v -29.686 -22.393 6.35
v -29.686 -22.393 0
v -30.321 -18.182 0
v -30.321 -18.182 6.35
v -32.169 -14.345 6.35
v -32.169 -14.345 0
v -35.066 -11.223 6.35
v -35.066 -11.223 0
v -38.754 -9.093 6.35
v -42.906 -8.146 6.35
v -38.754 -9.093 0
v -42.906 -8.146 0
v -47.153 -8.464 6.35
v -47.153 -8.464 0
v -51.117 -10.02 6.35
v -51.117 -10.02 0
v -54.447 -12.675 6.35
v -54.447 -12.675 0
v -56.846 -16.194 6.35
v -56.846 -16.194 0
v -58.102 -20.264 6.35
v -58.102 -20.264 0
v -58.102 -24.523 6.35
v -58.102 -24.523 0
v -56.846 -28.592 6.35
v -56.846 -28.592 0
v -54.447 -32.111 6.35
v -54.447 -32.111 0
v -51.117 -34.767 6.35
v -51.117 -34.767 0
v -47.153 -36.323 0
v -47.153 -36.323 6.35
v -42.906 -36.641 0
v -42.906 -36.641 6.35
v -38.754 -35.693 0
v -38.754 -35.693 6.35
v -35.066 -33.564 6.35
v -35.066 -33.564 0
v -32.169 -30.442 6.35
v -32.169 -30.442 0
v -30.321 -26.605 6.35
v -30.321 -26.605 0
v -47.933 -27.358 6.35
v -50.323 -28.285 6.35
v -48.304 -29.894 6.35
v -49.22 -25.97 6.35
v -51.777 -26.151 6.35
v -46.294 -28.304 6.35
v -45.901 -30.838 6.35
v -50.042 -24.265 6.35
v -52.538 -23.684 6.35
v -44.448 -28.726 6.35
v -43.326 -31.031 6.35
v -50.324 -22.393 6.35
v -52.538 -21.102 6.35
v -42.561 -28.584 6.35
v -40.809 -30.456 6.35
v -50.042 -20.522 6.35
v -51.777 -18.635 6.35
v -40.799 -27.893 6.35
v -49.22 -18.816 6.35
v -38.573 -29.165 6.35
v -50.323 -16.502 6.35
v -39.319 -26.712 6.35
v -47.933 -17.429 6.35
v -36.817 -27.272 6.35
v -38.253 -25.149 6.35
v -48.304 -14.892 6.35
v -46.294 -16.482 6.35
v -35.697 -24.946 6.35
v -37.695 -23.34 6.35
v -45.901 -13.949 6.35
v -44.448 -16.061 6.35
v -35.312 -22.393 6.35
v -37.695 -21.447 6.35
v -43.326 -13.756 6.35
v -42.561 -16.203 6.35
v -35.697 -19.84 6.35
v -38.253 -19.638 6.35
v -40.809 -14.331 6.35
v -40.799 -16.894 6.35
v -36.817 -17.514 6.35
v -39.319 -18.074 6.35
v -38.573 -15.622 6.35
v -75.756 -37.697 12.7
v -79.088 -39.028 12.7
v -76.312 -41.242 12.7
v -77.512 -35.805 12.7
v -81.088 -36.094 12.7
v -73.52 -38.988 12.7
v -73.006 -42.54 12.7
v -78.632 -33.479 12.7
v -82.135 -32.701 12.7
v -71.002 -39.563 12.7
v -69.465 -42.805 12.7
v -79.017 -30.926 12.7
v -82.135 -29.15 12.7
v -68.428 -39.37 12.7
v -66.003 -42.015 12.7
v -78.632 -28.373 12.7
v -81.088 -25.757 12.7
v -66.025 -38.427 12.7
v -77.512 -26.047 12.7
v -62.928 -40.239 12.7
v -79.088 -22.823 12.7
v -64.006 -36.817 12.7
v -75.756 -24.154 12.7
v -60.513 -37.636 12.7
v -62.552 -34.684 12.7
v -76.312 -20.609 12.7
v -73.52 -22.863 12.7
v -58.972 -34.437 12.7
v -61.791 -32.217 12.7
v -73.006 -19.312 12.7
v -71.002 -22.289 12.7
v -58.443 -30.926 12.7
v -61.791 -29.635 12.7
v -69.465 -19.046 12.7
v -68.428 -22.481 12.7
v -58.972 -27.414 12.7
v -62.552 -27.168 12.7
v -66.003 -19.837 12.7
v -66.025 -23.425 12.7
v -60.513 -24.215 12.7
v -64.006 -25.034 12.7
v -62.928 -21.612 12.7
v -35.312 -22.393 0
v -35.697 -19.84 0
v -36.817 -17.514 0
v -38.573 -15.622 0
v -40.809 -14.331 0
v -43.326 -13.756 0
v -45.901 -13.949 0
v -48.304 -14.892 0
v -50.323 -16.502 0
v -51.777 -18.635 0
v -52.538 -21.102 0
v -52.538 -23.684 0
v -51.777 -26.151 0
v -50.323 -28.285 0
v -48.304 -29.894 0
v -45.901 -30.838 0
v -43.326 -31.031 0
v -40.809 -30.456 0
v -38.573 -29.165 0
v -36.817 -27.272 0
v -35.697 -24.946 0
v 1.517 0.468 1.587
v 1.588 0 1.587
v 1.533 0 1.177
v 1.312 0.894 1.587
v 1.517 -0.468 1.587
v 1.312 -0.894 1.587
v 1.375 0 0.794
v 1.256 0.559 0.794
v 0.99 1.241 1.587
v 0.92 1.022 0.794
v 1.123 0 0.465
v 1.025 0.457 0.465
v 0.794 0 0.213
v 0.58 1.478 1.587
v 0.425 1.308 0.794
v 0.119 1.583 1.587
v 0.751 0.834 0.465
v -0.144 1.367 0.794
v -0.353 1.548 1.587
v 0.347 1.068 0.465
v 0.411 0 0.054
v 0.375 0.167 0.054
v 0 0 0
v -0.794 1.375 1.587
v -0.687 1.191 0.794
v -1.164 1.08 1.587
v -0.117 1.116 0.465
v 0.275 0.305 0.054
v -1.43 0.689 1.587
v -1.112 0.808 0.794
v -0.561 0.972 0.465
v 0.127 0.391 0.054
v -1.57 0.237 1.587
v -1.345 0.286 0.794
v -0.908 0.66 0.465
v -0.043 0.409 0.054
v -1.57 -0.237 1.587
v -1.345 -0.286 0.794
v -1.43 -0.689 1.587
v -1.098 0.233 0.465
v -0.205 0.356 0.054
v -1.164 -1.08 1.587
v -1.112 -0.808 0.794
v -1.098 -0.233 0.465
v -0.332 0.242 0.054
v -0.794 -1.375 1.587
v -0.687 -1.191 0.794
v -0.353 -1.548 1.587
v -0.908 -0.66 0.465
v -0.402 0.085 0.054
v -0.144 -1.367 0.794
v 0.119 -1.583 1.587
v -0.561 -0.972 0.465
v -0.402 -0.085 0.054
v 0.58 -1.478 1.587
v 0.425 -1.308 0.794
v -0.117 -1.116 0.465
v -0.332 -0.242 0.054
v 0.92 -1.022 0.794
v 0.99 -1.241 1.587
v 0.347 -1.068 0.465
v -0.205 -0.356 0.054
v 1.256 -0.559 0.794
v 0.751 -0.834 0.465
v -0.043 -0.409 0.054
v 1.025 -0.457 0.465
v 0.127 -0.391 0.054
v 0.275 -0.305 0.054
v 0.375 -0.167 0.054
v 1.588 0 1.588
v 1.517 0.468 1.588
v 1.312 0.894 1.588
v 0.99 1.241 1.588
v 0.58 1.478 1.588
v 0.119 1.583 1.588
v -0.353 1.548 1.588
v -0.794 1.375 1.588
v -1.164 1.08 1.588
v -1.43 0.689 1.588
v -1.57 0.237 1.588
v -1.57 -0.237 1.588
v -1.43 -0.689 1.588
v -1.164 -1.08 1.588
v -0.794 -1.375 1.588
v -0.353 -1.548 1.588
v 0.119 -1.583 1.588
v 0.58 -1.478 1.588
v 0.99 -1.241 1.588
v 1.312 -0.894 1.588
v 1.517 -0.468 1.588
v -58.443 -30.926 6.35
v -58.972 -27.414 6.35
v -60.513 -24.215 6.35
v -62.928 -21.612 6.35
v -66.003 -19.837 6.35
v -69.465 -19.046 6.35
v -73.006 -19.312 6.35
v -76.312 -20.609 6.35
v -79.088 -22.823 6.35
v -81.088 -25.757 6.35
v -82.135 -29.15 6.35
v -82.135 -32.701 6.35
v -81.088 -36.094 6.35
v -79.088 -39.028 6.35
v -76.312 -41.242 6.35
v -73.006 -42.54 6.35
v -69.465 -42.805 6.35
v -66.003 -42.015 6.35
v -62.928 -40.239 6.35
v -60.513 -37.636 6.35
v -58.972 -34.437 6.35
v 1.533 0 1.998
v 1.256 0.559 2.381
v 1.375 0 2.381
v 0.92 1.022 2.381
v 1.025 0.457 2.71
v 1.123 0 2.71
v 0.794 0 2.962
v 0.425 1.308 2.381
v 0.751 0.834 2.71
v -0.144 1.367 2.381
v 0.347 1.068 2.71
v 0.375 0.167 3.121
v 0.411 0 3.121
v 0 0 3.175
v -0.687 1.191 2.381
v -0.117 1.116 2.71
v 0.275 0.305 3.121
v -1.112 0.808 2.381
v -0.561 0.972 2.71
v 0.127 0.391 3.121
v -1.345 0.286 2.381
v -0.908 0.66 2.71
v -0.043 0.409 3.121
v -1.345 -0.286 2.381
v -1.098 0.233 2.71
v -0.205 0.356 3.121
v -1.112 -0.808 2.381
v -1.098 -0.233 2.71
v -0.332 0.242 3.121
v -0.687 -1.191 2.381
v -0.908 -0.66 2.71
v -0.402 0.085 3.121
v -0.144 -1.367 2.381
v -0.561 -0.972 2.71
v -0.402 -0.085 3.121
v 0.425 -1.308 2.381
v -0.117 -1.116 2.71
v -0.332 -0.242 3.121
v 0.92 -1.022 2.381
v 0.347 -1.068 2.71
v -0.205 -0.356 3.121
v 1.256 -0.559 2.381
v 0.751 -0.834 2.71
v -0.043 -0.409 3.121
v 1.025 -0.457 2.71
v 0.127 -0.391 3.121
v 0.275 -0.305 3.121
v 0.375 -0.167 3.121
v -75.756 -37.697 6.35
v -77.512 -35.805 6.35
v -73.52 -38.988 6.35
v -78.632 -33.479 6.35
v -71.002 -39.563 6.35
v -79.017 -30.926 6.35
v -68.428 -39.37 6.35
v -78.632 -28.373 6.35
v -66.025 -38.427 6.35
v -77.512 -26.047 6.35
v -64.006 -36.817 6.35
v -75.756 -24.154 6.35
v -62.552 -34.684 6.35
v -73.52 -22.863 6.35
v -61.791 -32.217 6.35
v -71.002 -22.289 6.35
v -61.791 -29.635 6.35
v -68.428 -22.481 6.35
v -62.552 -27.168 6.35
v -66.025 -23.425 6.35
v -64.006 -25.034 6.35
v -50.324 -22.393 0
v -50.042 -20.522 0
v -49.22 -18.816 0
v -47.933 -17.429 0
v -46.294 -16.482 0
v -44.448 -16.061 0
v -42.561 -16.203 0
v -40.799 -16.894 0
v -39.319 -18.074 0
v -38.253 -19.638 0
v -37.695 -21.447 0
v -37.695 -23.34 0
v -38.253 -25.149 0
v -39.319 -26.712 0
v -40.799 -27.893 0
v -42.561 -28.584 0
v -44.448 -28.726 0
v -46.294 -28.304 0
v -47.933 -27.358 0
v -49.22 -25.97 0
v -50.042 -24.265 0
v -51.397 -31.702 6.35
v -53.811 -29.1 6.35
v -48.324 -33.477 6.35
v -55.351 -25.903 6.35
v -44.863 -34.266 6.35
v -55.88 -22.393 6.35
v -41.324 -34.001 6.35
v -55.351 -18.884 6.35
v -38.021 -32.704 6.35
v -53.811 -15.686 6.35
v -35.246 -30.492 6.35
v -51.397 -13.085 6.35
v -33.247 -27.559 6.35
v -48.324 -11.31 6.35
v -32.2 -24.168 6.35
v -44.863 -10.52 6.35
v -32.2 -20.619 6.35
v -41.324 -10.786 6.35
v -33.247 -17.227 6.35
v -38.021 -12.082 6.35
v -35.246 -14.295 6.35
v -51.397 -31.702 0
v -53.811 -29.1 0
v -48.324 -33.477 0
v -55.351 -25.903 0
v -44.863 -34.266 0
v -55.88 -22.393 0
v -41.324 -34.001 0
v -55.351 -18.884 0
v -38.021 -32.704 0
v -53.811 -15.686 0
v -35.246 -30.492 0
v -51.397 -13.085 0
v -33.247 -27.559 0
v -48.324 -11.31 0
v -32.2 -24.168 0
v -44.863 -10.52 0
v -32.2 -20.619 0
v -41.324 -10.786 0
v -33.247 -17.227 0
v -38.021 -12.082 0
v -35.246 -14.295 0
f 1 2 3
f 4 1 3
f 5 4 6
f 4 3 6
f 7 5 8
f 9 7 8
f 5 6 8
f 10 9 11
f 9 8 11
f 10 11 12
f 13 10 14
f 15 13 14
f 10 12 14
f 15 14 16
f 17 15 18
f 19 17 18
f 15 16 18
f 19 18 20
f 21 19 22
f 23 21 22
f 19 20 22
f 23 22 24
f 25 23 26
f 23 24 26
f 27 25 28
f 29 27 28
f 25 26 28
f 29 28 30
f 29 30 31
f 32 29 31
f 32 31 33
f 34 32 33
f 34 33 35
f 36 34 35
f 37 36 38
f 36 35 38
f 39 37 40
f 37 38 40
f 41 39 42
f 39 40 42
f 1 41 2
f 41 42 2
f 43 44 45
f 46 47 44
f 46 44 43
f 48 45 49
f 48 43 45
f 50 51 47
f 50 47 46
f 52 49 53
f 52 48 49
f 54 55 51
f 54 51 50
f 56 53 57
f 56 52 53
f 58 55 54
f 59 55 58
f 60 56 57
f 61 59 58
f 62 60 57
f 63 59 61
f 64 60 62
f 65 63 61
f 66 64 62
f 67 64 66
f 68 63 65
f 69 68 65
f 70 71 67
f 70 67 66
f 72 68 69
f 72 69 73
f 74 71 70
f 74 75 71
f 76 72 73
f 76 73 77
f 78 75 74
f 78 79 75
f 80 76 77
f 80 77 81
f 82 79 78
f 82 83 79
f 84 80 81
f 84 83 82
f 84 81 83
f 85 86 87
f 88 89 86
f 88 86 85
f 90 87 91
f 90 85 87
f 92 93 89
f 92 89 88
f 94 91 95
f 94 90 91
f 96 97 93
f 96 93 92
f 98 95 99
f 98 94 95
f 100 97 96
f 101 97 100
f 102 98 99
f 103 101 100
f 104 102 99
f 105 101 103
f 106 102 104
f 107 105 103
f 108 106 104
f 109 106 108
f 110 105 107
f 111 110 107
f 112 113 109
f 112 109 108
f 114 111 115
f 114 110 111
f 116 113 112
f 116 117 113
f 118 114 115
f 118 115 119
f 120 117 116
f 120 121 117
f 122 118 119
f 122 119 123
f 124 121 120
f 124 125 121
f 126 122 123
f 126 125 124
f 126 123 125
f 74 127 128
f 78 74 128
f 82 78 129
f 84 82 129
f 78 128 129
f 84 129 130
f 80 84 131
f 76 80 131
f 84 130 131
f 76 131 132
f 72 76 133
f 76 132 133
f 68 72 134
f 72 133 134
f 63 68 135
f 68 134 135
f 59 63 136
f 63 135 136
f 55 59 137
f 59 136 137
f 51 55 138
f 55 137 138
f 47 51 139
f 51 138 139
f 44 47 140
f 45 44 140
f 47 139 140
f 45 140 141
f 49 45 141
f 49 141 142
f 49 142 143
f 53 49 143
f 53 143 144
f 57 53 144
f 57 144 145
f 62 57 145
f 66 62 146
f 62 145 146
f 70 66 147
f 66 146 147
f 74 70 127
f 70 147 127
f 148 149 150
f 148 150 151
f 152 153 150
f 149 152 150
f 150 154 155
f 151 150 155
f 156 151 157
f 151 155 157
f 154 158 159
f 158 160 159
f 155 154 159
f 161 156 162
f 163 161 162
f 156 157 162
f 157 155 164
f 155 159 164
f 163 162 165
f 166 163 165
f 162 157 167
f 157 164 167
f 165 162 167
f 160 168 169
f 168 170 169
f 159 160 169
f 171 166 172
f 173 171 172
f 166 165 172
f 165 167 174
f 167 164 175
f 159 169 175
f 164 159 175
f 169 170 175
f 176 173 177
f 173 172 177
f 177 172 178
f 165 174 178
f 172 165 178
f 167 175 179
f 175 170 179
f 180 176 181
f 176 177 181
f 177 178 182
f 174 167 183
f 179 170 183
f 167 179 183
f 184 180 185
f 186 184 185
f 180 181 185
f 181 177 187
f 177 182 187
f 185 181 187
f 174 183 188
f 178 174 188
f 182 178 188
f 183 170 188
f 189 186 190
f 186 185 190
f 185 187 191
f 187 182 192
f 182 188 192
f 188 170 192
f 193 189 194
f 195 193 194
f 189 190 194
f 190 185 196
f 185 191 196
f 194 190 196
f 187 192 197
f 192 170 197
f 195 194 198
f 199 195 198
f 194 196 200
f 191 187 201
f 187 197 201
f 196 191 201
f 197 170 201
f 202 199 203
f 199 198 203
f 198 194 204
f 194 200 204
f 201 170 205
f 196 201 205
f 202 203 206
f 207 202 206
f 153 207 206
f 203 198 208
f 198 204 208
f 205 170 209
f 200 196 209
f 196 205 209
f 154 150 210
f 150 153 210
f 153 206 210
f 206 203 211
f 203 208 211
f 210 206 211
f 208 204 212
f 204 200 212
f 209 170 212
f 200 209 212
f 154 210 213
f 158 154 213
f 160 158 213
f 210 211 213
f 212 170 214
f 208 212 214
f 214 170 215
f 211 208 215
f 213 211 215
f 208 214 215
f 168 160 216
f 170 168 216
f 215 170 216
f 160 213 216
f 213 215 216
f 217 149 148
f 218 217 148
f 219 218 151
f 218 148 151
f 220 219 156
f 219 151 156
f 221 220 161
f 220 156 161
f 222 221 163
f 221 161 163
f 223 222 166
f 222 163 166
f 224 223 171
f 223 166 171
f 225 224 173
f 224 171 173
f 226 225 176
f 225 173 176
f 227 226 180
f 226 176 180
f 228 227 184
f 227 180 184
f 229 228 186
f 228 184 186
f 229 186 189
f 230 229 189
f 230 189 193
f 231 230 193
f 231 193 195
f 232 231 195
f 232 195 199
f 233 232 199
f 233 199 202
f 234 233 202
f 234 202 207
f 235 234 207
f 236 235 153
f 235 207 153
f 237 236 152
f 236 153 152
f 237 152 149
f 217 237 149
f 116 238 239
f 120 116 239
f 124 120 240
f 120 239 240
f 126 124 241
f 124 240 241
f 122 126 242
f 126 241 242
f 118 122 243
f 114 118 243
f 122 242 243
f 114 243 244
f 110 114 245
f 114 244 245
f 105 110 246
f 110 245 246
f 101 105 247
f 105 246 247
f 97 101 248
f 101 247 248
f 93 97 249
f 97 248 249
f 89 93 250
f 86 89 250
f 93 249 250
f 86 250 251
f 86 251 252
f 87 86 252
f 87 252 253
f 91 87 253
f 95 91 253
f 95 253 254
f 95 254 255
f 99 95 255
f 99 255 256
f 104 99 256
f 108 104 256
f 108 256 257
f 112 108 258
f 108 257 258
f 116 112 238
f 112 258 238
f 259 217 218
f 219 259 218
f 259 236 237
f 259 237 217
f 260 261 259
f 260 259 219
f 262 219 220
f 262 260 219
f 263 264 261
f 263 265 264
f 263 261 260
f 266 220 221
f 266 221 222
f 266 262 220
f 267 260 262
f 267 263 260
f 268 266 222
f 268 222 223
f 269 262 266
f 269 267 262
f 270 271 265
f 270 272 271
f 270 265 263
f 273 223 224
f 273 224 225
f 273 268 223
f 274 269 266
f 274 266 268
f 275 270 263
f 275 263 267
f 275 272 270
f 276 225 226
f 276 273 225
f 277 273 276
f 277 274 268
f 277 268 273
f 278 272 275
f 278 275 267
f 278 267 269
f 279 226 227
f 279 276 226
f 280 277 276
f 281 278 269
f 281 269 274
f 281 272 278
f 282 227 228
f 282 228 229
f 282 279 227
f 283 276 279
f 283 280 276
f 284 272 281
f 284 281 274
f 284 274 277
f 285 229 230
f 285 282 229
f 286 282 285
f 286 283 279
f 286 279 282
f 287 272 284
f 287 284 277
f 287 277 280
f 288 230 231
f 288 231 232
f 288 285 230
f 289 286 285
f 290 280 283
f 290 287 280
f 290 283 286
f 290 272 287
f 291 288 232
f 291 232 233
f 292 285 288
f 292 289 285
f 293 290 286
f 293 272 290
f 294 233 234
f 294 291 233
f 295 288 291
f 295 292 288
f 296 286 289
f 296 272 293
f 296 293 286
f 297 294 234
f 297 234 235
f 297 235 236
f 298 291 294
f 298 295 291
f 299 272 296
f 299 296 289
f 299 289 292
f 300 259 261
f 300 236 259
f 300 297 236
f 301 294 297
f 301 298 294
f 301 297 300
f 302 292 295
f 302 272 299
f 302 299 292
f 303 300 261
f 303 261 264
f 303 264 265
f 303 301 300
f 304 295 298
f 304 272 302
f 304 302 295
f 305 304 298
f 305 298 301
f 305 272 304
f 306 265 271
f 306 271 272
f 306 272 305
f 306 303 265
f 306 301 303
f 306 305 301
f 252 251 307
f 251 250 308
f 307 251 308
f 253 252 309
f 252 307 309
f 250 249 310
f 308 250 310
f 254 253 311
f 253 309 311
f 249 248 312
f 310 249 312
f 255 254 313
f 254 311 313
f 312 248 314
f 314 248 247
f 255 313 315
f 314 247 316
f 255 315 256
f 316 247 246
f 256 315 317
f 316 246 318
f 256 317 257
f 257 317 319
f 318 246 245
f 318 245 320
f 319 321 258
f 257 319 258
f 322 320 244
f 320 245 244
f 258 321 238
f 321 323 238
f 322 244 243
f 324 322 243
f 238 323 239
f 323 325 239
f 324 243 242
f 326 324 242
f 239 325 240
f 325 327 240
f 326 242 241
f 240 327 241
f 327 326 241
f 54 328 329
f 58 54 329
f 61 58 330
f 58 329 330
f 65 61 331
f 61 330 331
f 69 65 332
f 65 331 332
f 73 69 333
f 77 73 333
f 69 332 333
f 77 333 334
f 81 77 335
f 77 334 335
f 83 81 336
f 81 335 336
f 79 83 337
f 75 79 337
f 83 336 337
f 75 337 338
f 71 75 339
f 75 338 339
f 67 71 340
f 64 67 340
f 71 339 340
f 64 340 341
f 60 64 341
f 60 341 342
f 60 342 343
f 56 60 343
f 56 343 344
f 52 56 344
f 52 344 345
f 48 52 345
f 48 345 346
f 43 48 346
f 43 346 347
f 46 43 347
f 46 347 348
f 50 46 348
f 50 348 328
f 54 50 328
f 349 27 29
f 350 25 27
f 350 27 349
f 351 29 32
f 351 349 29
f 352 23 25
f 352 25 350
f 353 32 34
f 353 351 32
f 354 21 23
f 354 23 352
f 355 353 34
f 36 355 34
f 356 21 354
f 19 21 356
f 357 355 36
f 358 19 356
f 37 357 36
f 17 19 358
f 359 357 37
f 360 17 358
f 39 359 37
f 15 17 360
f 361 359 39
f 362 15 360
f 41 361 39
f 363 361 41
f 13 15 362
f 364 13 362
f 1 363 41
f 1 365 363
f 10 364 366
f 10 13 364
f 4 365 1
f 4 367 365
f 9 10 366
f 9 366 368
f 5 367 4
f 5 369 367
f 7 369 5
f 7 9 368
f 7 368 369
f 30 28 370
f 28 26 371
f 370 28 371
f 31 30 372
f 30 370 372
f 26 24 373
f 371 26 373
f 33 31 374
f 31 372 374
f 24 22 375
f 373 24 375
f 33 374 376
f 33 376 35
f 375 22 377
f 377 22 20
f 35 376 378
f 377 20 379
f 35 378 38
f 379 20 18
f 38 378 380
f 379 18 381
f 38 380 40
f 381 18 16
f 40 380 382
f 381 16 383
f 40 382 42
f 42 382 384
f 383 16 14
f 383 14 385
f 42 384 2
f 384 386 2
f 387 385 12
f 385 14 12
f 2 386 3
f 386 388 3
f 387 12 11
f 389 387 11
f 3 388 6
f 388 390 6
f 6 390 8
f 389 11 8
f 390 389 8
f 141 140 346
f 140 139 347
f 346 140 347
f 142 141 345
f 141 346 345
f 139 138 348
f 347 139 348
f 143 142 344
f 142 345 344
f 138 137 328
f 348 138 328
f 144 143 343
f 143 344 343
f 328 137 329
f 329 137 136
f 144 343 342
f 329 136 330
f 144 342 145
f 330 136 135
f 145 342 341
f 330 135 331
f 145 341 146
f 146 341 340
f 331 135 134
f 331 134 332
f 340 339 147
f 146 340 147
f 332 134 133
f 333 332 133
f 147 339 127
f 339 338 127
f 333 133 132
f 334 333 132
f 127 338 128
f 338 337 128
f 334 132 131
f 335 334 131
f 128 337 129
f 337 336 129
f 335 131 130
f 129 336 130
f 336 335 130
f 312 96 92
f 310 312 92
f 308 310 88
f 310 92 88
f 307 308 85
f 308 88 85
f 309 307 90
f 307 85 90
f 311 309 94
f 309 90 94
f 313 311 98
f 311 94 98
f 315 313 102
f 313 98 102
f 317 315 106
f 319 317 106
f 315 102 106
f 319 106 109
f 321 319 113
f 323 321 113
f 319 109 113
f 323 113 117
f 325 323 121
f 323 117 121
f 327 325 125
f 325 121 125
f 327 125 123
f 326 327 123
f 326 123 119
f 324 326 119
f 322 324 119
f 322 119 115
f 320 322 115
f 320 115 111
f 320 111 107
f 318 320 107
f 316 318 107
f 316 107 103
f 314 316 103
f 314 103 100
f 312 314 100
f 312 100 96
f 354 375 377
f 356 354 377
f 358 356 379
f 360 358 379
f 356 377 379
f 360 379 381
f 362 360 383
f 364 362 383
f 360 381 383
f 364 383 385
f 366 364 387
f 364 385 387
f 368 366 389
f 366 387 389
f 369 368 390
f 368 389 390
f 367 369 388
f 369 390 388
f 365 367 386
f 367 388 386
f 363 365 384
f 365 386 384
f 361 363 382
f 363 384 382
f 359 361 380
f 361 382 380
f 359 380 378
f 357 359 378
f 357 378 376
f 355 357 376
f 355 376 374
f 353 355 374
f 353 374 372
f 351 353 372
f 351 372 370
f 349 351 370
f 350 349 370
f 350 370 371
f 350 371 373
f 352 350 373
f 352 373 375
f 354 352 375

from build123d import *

# Parameters (mm, degrees)
F0_R      = 14.2875
F1_DEPTH  = 6.35
F3_D      = 23.8125
F4_R      = 8.6614
F5_DEPTH  = 6.35
F7_D      = 12.7
F8_R      = 1.5875
F9_DEPTH  = 3.175
F10_R     = 1.58749
F11_R     = 11.9126
F12_DEPTH = 6.35
F13_D     = 17.3228


# Not quite as in the source:
# - a fillet or chamfer is up to 0.001 mm smaller than in the source, because OpenCascade refuses the exact size


with BuildPart() as f1:
    # F0 (on Top) → F1 (new body)
    with BuildSketch(Plane.XY):
        with Locations((-43.9736843109, -22.3933495581)):
            Circle(F0_R)
    extrude(amount=F1_DEPTH)

    # F3 (through all)
    with Locations(Plane.XY.offset(6.35)):
        with Locations((-43.9736843109, -22.3933495581)):
            Hole(F3_D / 2)


with BuildPart() as f5:
    # F4 (on Top) → F5 (new body)
    with BuildSketch(Plane.XY):
        with Locations((-43.9736843109, -22.3933495581)):
            Circle(F4_R)
    extrude(amount=F5_DEPTH)

    # F7 (through all)
    with Locations(Plane.XY.offset(6.35)):
        with Locations((-43.9736843109, -22.3933495581)):
            Hole(F7_D / 2)


with BuildPart() as f9:
    # F8 (on Top) → F9 (new body)
    with BuildSketch(Plane.XY):
        Circle(F8_R)
    extrude(amount=F9_DEPTH)

    # F10 (radius 1.5875 in the source; OpenCascade refuses exactly that, so slightly less here)
    f10_edges = [f9.edges().sort_by_distance(p)[0] for p in [
        (-1.5875, 0, 3.175),
        (-1.5875, 0, 0),
    ]]
    fillet(f10_edges, radius=F10_R)


with BuildPart() as f12:
    # F11 (on face) → F12 (new body)
    with BuildSketch(Plane.XY.offset(6.35)):
        with Locations((-70.3552216291, -30.9257358313)):
            Circle(F11_R)
    extrude(amount=F12_DEPTH)

    # F13 (through all)
    with Locations(Plane(origin=(0, 0, 6.35), x_dir=(1, 0, 0), z_dir=(0, 0, -1))):
        with Locations((-70.3552216291, 30.9257358313)):
            Hole(F13_D / 2)


solid = Compound([f1.part, f5.part, f9.part, f12.part])
